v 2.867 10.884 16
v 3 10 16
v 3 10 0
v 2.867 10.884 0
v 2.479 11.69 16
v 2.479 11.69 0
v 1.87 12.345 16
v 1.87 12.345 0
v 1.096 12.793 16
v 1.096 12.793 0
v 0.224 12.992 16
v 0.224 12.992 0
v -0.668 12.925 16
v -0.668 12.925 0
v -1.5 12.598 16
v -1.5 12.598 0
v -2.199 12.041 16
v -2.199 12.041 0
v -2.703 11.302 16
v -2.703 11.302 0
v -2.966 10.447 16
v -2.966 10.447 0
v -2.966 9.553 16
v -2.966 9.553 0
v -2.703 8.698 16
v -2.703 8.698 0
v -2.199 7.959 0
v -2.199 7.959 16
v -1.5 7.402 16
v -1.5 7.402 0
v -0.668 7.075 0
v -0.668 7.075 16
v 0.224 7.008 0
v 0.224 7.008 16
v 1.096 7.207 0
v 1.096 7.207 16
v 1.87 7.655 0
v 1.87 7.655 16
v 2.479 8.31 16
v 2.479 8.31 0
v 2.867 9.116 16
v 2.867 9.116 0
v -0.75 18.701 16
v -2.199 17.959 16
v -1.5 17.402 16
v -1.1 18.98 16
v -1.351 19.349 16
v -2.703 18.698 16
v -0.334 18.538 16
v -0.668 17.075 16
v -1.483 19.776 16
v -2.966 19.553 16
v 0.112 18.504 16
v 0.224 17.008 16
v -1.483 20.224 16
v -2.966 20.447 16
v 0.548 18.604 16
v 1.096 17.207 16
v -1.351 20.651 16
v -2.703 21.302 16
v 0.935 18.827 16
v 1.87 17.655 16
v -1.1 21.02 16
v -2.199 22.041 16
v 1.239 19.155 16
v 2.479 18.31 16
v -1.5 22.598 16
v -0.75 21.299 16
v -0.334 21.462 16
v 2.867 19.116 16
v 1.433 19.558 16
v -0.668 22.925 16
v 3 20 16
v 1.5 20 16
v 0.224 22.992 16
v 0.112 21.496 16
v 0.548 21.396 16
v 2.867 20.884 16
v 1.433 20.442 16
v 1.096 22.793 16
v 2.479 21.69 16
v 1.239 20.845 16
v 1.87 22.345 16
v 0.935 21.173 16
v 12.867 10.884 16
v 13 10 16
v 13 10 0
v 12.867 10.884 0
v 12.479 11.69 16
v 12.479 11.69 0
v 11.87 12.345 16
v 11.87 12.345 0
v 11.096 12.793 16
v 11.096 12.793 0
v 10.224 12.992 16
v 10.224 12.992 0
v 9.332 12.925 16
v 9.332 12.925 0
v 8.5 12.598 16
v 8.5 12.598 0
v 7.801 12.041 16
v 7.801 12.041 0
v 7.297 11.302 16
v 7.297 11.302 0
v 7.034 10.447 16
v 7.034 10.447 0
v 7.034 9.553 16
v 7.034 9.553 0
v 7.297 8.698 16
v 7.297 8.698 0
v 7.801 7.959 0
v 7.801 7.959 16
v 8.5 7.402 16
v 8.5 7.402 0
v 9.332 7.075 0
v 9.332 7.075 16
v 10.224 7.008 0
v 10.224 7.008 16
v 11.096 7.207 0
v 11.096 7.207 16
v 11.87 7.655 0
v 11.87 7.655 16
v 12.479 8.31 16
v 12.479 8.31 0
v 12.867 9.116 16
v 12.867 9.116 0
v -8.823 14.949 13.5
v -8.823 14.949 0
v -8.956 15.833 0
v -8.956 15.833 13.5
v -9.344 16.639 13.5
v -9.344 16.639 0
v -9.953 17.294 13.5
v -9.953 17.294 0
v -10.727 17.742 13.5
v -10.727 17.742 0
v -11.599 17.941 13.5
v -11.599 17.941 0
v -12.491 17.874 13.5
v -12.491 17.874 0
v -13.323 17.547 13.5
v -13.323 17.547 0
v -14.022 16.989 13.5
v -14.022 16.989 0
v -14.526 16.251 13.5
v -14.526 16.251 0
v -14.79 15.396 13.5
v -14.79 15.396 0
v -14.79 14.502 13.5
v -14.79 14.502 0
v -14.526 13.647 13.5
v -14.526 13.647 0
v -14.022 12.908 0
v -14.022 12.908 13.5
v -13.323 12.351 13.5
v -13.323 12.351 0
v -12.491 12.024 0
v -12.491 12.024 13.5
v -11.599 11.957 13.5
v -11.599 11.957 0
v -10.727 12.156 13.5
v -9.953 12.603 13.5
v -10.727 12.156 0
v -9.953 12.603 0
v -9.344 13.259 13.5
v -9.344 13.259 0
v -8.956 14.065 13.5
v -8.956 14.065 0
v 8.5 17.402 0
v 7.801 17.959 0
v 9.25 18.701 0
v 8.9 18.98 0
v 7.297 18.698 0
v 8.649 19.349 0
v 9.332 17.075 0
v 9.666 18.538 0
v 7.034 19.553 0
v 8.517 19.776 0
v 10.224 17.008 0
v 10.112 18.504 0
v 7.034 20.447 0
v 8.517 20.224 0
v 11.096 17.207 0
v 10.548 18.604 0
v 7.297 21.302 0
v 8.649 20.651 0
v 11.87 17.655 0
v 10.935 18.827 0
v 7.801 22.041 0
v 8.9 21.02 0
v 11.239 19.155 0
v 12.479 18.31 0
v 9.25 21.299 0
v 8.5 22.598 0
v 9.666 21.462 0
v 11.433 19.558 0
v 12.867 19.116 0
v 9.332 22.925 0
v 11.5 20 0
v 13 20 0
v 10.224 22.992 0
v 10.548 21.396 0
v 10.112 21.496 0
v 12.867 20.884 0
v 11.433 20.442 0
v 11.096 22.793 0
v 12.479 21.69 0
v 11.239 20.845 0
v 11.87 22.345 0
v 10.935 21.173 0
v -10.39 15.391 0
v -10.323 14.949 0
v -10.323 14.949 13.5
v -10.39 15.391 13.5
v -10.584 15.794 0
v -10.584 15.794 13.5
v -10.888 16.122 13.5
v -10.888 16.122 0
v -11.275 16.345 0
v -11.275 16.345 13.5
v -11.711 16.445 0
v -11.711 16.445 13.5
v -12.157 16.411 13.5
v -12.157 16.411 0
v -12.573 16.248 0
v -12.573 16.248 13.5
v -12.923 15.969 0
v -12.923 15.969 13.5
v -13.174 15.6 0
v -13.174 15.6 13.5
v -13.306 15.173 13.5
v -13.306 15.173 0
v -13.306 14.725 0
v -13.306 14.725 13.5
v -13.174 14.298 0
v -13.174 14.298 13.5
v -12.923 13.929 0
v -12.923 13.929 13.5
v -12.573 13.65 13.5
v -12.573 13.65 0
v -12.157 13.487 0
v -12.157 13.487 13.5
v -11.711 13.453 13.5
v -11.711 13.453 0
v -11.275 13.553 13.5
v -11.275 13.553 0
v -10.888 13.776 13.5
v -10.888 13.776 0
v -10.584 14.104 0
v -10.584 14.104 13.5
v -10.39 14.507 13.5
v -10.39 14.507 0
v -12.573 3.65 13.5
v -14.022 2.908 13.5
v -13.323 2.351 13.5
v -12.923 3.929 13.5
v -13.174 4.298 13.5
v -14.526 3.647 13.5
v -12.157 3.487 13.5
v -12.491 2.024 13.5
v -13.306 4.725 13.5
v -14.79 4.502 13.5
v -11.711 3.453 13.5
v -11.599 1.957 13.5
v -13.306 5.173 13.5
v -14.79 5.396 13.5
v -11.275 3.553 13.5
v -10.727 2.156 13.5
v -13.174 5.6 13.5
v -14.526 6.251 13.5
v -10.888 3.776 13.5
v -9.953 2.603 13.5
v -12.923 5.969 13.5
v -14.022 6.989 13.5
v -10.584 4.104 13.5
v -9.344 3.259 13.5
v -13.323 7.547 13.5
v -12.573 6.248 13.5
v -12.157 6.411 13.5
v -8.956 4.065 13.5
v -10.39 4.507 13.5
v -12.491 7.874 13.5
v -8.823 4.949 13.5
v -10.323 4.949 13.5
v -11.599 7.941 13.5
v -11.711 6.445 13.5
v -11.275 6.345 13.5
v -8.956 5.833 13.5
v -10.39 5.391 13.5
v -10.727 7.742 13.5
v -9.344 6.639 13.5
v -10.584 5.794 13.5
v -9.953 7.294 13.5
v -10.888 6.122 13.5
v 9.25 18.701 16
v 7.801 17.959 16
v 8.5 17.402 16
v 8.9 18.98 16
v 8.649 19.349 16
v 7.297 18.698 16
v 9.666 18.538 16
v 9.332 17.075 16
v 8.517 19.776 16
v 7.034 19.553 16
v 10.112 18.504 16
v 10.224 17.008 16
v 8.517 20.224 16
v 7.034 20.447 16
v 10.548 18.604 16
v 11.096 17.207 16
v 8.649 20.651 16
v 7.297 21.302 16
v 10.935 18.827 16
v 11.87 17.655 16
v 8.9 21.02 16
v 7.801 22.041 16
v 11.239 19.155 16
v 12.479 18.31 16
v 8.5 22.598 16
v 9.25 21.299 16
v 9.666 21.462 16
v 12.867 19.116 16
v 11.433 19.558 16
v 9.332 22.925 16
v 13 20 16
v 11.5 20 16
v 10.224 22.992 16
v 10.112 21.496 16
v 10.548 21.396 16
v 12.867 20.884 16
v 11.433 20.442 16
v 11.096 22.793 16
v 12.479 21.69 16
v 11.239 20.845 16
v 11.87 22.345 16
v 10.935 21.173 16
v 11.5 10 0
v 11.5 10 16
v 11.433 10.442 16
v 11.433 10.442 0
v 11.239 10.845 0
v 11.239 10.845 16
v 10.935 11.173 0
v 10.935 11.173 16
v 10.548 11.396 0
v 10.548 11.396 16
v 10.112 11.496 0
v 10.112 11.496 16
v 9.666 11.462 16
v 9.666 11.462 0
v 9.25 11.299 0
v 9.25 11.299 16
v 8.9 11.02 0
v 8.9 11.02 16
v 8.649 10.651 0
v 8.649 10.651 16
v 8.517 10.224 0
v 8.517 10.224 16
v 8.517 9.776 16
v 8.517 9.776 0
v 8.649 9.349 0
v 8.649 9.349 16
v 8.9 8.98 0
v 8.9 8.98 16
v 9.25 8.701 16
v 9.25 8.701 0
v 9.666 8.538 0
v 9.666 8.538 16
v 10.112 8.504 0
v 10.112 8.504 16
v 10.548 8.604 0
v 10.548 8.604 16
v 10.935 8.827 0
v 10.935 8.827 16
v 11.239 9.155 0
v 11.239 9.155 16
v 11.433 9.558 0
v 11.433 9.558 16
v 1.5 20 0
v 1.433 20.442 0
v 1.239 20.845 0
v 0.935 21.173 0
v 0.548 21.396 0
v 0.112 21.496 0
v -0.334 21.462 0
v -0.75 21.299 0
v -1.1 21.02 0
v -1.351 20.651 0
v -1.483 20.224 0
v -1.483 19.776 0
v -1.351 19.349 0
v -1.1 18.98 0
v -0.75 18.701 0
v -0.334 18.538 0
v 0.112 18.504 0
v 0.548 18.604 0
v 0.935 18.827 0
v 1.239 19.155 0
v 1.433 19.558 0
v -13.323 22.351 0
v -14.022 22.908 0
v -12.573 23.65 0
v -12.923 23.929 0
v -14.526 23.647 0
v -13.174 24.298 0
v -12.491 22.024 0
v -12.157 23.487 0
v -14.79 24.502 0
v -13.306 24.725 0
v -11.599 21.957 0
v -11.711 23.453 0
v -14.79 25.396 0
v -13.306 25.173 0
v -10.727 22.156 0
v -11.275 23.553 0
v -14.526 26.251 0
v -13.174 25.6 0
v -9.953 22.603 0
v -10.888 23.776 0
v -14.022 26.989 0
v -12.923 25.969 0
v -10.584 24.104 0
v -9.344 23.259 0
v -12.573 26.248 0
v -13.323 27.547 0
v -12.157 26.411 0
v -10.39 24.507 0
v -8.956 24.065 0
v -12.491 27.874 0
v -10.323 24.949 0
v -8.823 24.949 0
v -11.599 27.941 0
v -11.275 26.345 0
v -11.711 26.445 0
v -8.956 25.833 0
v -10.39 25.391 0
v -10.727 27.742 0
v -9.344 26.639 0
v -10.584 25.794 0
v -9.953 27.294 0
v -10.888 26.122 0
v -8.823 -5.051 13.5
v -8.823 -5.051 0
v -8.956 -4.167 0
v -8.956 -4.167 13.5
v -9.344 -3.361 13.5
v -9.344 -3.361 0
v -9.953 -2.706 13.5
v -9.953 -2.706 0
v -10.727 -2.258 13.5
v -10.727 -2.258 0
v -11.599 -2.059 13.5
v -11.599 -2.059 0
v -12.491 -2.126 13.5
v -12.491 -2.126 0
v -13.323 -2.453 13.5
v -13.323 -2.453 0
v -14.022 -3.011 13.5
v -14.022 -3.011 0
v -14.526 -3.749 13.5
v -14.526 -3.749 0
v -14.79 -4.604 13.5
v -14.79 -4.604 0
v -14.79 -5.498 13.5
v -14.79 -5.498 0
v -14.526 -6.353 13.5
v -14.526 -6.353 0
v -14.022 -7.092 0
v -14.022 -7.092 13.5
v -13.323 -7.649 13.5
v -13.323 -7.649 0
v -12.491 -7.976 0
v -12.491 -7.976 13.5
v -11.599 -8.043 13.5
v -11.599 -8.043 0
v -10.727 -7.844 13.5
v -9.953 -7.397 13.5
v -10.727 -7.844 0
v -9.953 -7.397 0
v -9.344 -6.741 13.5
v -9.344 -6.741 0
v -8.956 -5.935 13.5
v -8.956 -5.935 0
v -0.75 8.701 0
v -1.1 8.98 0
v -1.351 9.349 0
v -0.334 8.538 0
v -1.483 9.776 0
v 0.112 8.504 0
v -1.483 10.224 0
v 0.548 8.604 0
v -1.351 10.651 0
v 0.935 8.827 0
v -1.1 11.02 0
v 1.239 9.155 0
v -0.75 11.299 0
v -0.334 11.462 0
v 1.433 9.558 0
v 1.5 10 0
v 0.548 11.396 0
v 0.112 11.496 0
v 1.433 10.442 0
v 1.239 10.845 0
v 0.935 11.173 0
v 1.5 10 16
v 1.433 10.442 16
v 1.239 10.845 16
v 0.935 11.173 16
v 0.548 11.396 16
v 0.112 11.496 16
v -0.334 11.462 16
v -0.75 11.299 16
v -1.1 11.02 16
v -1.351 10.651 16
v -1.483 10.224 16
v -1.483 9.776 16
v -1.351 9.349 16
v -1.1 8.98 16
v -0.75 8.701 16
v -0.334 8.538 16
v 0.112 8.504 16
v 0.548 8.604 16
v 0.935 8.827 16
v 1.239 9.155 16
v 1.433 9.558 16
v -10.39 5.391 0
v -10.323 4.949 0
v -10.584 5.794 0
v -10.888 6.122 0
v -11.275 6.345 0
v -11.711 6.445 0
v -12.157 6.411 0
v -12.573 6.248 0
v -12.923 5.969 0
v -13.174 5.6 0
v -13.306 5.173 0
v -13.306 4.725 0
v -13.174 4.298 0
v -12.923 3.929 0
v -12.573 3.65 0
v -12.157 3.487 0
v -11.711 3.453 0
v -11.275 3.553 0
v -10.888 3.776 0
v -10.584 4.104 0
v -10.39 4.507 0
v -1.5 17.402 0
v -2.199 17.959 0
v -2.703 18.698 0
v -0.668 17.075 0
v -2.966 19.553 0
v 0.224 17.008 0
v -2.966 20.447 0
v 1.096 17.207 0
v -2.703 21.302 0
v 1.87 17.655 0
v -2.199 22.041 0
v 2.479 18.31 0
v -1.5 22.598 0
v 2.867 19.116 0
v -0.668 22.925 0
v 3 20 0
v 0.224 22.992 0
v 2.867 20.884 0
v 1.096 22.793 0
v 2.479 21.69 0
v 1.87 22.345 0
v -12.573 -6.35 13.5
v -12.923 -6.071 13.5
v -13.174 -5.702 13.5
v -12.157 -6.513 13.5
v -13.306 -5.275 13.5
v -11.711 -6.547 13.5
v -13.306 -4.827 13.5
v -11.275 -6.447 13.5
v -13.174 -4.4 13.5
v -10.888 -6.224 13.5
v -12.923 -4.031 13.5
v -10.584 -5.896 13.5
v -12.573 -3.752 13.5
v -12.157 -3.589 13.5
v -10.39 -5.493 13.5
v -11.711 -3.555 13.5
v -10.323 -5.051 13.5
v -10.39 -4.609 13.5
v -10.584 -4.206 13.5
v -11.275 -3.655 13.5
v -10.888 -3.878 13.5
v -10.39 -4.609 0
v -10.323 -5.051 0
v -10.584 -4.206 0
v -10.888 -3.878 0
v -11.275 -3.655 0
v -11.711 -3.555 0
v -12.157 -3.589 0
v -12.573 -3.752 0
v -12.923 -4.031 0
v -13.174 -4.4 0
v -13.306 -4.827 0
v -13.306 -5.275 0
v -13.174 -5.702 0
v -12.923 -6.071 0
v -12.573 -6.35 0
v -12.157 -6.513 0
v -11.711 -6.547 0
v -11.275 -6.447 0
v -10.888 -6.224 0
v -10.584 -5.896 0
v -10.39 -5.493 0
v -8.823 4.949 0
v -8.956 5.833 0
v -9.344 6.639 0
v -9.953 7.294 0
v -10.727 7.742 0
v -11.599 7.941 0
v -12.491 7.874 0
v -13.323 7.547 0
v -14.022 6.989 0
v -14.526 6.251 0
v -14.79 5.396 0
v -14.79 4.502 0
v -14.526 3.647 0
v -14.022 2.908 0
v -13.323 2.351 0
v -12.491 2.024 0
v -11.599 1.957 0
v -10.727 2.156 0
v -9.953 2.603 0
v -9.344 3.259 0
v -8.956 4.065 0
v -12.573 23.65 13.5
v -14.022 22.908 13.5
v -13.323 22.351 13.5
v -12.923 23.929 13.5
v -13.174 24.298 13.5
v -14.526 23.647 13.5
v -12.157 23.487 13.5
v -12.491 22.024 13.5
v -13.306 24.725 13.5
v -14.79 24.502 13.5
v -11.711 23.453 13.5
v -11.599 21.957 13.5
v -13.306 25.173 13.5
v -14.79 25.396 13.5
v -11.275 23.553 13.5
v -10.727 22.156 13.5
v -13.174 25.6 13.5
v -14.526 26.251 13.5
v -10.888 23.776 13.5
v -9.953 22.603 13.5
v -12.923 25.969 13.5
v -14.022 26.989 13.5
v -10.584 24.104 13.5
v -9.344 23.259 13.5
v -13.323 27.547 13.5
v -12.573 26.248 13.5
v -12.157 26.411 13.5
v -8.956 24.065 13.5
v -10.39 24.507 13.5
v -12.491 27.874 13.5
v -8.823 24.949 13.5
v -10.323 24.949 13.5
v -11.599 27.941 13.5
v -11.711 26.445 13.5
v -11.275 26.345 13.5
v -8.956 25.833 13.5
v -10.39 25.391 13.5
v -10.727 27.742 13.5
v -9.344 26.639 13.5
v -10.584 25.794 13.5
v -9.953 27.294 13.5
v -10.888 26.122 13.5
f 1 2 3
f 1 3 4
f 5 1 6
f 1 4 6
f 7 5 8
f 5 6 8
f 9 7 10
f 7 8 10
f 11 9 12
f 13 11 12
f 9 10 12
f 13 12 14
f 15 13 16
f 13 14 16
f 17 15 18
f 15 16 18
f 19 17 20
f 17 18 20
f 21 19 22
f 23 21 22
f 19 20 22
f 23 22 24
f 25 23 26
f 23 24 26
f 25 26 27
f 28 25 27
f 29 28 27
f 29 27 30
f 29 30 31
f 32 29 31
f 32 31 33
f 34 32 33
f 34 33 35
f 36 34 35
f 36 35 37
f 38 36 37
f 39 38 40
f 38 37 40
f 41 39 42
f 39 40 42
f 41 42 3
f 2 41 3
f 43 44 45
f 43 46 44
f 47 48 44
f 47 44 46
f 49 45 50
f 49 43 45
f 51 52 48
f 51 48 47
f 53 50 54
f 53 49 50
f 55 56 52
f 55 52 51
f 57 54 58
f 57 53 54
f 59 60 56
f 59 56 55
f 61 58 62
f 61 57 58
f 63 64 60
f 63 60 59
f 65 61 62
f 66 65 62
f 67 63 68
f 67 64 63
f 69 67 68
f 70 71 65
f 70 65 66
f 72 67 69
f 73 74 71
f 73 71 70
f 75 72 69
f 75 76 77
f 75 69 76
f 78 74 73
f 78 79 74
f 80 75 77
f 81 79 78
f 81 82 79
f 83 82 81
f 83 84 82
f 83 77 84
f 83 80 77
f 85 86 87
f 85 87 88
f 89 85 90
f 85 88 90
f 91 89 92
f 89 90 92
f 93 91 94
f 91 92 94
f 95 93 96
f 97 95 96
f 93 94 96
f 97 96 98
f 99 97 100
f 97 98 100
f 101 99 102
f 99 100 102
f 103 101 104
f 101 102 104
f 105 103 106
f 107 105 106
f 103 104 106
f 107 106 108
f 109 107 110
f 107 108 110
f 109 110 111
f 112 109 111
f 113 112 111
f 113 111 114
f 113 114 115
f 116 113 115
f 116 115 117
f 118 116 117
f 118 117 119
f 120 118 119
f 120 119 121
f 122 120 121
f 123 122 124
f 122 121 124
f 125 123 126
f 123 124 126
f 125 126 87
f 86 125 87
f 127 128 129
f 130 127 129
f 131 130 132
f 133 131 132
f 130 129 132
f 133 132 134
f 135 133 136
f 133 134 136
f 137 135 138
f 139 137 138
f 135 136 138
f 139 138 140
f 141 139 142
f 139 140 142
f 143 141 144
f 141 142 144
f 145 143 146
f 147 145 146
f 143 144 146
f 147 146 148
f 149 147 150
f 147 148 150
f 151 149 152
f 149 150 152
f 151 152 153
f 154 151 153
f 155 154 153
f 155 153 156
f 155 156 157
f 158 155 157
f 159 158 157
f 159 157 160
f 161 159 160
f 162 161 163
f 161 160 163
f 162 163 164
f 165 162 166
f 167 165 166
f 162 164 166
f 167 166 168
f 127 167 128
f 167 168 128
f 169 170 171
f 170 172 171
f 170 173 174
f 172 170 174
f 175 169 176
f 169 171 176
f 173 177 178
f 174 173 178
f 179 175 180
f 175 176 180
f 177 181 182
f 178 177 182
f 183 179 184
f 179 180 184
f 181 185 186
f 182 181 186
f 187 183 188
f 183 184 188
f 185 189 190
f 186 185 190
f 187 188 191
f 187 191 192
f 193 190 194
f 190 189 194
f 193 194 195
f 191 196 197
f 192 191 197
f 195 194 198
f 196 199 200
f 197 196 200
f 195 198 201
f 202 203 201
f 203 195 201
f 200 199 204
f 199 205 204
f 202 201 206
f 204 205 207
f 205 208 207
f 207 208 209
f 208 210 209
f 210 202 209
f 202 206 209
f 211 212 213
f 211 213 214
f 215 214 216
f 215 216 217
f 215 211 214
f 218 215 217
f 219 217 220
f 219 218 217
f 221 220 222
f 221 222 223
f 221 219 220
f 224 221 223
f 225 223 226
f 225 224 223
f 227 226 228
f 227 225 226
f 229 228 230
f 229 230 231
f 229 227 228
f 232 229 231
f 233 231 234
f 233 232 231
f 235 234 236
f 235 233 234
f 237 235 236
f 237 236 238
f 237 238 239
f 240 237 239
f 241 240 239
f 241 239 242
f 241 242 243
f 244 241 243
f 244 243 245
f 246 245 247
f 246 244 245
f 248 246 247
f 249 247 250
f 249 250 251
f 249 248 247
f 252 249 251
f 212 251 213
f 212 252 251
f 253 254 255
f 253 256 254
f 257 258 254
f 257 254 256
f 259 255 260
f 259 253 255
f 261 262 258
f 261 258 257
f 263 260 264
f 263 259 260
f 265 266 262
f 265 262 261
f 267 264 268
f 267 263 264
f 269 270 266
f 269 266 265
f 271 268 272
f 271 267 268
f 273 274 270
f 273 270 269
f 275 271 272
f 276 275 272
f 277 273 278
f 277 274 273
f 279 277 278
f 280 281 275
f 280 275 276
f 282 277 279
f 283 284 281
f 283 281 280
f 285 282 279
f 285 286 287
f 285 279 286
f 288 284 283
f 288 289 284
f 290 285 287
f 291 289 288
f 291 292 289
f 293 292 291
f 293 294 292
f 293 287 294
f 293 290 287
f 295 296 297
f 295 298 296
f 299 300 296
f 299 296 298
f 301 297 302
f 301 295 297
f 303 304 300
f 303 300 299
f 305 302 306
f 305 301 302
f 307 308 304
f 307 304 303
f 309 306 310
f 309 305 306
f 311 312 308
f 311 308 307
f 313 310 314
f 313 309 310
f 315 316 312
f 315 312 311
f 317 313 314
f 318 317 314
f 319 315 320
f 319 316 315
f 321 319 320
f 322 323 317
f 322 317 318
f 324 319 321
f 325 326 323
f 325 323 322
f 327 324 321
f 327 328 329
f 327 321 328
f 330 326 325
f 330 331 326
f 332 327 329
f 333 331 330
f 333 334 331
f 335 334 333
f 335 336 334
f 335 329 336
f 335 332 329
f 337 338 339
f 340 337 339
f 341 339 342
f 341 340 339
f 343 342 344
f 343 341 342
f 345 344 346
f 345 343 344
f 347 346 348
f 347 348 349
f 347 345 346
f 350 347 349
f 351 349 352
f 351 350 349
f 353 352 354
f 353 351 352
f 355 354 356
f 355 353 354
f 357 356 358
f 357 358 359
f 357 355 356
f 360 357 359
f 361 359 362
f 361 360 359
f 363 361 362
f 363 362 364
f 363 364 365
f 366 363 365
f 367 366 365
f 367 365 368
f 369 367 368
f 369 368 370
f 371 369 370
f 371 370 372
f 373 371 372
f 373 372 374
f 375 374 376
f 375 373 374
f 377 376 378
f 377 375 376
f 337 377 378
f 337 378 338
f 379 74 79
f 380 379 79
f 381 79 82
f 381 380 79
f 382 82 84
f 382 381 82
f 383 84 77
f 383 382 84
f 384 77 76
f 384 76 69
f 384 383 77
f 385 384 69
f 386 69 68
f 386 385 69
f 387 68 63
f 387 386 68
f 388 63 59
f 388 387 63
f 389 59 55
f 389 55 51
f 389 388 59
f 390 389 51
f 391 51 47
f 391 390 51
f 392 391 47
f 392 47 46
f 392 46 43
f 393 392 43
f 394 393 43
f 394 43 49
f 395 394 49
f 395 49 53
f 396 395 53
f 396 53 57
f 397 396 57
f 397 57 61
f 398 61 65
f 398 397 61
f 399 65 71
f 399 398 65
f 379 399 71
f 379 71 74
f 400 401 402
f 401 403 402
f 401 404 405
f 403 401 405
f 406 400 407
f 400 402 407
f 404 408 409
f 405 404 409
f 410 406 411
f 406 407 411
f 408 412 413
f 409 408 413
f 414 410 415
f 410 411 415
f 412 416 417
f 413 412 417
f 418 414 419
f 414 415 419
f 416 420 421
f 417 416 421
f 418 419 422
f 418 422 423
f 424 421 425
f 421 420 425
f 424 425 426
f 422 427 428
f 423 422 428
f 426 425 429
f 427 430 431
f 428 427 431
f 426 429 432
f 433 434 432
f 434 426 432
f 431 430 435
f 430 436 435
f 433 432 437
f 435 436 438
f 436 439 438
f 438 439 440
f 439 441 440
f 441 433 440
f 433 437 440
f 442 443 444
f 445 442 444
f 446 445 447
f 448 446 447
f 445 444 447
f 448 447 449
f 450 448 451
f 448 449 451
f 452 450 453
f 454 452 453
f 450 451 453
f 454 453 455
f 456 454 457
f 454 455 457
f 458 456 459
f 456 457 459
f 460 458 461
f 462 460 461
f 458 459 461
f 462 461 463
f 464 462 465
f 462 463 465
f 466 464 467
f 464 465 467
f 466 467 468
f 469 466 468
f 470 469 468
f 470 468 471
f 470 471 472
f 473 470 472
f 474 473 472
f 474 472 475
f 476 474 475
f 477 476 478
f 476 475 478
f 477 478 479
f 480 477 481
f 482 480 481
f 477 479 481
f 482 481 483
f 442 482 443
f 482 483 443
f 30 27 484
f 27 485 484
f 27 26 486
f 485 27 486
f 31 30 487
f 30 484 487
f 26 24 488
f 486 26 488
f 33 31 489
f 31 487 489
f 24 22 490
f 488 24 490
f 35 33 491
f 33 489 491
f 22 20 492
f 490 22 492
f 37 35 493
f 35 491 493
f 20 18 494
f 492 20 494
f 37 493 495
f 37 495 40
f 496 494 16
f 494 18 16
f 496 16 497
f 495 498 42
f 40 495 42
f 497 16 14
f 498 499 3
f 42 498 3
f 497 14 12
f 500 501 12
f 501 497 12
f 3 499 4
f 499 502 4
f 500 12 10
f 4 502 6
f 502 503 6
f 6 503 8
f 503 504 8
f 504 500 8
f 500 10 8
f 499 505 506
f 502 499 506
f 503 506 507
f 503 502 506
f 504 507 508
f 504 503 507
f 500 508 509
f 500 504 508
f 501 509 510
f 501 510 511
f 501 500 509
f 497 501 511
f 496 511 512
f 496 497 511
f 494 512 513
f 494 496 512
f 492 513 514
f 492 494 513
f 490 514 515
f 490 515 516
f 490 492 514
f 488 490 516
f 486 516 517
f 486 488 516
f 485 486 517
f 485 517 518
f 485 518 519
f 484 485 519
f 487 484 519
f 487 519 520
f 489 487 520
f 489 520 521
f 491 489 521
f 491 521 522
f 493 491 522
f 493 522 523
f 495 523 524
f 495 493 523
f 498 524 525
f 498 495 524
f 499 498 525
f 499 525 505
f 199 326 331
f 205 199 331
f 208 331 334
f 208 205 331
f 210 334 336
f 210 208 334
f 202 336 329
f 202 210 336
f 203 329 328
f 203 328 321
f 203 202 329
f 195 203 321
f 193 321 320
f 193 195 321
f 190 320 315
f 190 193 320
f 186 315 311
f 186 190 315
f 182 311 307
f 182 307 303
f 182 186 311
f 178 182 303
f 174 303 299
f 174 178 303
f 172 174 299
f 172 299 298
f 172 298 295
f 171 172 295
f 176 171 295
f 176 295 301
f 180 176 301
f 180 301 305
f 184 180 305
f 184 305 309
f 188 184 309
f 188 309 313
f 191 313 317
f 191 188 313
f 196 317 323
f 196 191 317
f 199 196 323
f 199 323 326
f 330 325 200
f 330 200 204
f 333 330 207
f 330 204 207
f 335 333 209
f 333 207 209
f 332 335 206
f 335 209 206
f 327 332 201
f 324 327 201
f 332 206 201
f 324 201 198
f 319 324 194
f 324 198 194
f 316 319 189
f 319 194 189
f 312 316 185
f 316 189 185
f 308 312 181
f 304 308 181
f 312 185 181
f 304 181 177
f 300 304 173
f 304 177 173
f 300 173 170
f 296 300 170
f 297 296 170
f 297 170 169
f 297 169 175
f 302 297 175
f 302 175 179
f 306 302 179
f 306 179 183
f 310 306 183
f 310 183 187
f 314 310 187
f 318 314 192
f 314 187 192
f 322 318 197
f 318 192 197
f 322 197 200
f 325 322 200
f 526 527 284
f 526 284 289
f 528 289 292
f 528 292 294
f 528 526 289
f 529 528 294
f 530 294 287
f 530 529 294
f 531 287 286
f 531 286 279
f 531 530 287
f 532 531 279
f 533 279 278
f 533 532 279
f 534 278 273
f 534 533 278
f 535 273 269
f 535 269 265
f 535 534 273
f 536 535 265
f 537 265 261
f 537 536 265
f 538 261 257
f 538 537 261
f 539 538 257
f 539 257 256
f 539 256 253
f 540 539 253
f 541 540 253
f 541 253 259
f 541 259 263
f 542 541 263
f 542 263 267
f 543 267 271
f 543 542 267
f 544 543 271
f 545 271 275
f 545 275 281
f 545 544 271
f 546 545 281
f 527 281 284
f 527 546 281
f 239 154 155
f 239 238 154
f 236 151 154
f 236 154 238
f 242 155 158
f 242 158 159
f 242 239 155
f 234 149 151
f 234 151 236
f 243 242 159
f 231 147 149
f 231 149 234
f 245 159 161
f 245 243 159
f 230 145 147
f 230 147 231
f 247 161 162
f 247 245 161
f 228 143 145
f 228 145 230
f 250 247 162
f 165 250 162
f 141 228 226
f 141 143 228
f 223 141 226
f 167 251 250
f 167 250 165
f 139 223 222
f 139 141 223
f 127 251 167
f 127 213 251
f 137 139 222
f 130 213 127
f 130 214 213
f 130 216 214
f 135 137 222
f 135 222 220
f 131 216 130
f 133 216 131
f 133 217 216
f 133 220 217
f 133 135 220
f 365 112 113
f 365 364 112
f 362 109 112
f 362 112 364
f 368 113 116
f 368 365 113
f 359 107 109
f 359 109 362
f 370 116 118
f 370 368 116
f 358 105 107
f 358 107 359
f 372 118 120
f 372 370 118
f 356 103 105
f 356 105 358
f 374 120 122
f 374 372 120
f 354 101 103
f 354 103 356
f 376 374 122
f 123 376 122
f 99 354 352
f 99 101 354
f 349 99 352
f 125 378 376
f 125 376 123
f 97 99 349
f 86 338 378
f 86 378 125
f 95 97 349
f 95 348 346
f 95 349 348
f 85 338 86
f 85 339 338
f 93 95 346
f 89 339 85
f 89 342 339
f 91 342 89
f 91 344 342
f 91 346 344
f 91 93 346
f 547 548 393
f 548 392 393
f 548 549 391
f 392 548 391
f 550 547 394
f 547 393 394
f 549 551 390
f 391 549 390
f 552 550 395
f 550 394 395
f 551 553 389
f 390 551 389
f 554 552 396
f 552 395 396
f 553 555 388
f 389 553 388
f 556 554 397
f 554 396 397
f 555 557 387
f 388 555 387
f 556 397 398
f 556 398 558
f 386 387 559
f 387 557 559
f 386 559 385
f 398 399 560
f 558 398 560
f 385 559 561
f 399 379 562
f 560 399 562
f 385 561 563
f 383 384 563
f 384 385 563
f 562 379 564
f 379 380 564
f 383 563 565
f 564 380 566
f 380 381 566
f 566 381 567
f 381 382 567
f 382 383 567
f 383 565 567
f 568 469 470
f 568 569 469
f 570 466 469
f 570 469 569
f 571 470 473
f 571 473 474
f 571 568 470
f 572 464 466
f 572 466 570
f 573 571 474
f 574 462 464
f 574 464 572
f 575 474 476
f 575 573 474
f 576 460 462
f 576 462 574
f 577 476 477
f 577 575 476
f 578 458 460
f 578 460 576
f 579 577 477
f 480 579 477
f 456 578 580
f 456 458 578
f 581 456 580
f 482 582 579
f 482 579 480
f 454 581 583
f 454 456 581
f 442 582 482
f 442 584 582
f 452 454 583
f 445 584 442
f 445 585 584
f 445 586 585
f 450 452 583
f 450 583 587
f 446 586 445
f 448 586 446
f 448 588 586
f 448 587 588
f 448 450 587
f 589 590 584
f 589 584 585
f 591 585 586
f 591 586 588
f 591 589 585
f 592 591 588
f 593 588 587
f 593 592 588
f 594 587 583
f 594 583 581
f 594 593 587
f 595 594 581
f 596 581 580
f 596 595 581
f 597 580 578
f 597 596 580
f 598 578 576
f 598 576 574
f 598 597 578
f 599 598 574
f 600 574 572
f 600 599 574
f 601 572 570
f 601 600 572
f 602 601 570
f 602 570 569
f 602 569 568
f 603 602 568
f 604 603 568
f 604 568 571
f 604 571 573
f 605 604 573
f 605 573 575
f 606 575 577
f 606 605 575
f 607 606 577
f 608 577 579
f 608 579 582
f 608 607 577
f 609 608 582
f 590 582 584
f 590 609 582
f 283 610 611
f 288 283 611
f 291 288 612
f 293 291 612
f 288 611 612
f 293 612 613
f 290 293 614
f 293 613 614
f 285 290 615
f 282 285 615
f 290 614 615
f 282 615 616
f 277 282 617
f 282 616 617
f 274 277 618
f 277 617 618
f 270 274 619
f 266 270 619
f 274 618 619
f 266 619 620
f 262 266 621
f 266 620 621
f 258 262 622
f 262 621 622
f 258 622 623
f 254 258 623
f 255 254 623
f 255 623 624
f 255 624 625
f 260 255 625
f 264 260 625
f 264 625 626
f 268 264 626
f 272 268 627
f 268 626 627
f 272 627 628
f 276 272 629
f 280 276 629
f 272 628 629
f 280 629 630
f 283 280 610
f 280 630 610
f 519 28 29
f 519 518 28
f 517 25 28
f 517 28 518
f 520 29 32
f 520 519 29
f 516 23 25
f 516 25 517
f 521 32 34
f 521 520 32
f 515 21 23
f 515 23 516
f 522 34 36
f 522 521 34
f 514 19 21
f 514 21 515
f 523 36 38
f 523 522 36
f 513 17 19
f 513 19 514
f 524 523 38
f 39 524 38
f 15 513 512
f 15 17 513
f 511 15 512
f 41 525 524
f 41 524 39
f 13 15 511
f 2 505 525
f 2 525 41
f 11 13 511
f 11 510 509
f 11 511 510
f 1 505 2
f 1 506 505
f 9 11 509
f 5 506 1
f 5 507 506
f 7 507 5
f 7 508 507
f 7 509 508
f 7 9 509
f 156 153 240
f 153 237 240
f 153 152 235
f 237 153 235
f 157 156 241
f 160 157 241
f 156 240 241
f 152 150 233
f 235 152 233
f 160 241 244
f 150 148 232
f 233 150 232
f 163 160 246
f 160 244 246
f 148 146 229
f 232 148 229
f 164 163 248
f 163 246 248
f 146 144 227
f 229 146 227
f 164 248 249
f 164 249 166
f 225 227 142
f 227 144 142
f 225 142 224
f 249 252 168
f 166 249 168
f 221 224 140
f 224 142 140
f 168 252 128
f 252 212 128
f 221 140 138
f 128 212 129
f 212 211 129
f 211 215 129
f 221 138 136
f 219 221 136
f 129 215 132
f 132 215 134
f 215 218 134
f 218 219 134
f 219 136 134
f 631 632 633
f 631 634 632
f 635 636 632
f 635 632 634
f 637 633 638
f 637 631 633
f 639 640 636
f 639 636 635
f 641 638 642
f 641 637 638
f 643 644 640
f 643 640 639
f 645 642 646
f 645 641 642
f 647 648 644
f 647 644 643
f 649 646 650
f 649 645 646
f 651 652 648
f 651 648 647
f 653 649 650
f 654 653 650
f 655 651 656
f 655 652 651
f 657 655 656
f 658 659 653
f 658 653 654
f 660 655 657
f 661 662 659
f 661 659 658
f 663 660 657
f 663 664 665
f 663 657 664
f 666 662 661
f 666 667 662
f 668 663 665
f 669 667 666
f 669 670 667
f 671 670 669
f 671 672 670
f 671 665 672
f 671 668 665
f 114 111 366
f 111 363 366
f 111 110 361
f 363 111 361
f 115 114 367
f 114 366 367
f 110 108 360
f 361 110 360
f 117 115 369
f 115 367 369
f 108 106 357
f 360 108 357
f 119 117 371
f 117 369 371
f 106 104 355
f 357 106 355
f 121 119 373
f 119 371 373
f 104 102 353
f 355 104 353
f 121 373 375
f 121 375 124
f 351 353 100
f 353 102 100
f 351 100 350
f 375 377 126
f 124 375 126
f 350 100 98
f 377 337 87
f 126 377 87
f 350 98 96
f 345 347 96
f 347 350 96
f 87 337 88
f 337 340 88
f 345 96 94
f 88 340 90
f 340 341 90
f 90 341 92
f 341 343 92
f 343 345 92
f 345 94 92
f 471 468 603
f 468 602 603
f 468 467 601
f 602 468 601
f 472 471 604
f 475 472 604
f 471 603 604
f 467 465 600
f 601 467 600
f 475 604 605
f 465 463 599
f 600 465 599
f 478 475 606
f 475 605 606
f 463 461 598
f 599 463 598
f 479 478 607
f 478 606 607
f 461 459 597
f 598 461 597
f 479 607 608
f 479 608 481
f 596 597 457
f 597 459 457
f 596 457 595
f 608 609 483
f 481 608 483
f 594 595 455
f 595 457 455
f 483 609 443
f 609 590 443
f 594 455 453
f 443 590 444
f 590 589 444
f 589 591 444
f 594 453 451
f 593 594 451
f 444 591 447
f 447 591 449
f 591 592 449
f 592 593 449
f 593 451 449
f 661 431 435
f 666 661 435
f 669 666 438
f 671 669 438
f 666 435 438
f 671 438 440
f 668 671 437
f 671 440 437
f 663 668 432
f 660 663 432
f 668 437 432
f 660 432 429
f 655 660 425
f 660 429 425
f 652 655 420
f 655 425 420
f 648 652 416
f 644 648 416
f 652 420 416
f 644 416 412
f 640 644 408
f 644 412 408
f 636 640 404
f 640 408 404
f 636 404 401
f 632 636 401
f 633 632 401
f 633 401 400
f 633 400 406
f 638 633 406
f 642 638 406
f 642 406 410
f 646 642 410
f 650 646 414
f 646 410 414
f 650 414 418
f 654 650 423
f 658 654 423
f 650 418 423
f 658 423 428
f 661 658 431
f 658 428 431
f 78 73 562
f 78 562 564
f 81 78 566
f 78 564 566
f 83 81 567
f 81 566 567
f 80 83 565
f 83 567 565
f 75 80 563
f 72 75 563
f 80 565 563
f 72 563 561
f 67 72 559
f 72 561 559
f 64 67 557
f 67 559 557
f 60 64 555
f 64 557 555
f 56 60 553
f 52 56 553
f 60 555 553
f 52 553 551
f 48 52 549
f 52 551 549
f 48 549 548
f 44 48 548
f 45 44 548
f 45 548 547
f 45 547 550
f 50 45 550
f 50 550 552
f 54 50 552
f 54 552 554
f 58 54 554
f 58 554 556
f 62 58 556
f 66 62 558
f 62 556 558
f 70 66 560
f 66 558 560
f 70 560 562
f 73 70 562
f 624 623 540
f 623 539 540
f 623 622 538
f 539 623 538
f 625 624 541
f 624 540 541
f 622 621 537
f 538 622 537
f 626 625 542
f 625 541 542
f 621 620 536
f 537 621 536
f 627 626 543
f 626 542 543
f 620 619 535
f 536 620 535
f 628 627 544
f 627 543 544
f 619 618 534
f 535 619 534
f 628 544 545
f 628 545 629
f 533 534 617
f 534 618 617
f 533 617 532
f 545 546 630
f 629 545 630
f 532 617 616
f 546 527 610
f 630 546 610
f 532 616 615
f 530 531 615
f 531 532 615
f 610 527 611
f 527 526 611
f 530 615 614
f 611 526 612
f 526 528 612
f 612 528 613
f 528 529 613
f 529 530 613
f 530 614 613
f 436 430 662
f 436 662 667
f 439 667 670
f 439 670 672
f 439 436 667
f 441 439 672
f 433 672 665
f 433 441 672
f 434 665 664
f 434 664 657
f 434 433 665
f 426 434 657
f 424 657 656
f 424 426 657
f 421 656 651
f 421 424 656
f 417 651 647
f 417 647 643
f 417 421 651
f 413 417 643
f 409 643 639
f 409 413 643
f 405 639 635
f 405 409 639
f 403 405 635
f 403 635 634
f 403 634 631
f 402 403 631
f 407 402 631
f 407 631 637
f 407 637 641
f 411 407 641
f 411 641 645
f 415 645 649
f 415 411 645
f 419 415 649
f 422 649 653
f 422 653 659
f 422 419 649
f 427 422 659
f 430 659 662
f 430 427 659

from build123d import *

# Parameters (mm, degrees)
ESQUISSE1_R                = 3
ESQUISSE1_R_2              = 1.5
BOSS_EXTRU_1_DEPTH         = 16
BOSS_EXTRU_1_2_DEPTH       = 16
BOSS_EXTRU_1_3_DEPTH       = 16
BOSS_EXTRU_1_4_DEPTH       = 16
ESQUISSE2_R                = 3
ESQUISSE2_R_2              = 1.5
BOSS_EXTRU_2_DEPTH         = 13.5
BOSS_EXTRU_2_2_DEPTH       = 13.5
R_P_TITION_LIN_AIRE1_COUNT = 2
R_P_TITION_LIN_AIRE1_PITCH = 20


with BuildPart() as part:
    # Esquisse1 → Boss.-Extru.1 (new body)
    with BuildSketch(Plane.XY):
        with Locations((10, 10)):
            Circle(ESQUISSE1_R)
        with Locations((10, 10)):
            Circle(ESQUISSE1_R_2, mode=Mode.SUBTRACT)
    extrude(amount=BOSS_EXTRU_1_DEPTH)


with BuildPart() as body_2:
    # Esquisse1 → Boss.-Extru.1 2 (new body)
    with BuildSketch(Plane.XY):
        with Locations((10, 20)):
            Circle(ESQUISSE1_R)
        with Locations((10, 20)):
            Circle(ESQUISSE1_R_2, mode=Mode.SUBTRACT)
    extrude(amount=BOSS_EXTRU_1_2_DEPTH)


with BuildPart() as body_3:
    # Esquisse1 → Boss.-Extru.1 3 (new body)
    with BuildSketch(Plane.XY):
        with Locations((0, 10)):
            Circle(ESQUISSE1_R)
        with Locations((0, 10)):
            Circle(ESQUISSE1_R_2, mode=Mode.SUBTRACT)
    extrude(amount=BOSS_EXTRU_1_3_DEPTH)


with BuildPart() as body_4:
    # Esquisse1 → Boss.-Extru.1 4 (new body)
    with BuildSketch(Plane.XY):
        with Locations((0, 20)):
            Circle(ESQUISSE1_R)
        with Locations((0, 20)):
            Circle(ESQUISSE1_R_2, mode=Mode.SUBTRACT)
    extrude(amount=BOSS_EXTRU_1_4_DEPTH)


with BuildPart() as body_5:
    # Esquisse2 → Boss.-Extru.2 (new body)
    with BuildSketch(Plane.XY):
        with Locations((-11.823031731, 14.948946981)):
            Circle(ESQUISSE2_R)
        with Locations((-11.823031731, 14.948946981)):
            Circle(ESQUISSE2_R_2, mode=Mode.SUBTRACT)
    boss_extru_2 = extrude(amount=BOSS_EXTRU_2_DEPTH)


with BuildPart() as body_6:
    # Esquisse2 → Boss.-Extru.2 2 (new body)
    with BuildSketch(Plane.XY):
        with Locations((-11.823031731, 24.948946981)):
            Circle(ESQUISSE2_R)
        with Locations((-11.823031731, 24.948946981)):
            Circle(ESQUISSE2_R_2, mode=Mode.SUBTRACT)
    boss_extru_2_2 = extrude(amount=BOSS_EXTRU_2_2_DEPTH)


with BuildPart() as r_p_tition_lin_aire1_1:
    # Répétition linéaire1: Boss.-Extru.2, Boss.-Extru.2 2 ×2
    with Locations(*[(0, -i * R_P_TITION_LIN_AIRE1_PITCH, 0) for i in range(1, R_P_TITION_LIN_AIRE1_COUNT)]):
        add(boss_extru_2)
        add(boss_extru_2_2)


solid = Compound([part.part, body_2.part, body_3.part, body_4.part, body_5.part, body_6.part, r_p_tition_lin_aire1_1.part])
